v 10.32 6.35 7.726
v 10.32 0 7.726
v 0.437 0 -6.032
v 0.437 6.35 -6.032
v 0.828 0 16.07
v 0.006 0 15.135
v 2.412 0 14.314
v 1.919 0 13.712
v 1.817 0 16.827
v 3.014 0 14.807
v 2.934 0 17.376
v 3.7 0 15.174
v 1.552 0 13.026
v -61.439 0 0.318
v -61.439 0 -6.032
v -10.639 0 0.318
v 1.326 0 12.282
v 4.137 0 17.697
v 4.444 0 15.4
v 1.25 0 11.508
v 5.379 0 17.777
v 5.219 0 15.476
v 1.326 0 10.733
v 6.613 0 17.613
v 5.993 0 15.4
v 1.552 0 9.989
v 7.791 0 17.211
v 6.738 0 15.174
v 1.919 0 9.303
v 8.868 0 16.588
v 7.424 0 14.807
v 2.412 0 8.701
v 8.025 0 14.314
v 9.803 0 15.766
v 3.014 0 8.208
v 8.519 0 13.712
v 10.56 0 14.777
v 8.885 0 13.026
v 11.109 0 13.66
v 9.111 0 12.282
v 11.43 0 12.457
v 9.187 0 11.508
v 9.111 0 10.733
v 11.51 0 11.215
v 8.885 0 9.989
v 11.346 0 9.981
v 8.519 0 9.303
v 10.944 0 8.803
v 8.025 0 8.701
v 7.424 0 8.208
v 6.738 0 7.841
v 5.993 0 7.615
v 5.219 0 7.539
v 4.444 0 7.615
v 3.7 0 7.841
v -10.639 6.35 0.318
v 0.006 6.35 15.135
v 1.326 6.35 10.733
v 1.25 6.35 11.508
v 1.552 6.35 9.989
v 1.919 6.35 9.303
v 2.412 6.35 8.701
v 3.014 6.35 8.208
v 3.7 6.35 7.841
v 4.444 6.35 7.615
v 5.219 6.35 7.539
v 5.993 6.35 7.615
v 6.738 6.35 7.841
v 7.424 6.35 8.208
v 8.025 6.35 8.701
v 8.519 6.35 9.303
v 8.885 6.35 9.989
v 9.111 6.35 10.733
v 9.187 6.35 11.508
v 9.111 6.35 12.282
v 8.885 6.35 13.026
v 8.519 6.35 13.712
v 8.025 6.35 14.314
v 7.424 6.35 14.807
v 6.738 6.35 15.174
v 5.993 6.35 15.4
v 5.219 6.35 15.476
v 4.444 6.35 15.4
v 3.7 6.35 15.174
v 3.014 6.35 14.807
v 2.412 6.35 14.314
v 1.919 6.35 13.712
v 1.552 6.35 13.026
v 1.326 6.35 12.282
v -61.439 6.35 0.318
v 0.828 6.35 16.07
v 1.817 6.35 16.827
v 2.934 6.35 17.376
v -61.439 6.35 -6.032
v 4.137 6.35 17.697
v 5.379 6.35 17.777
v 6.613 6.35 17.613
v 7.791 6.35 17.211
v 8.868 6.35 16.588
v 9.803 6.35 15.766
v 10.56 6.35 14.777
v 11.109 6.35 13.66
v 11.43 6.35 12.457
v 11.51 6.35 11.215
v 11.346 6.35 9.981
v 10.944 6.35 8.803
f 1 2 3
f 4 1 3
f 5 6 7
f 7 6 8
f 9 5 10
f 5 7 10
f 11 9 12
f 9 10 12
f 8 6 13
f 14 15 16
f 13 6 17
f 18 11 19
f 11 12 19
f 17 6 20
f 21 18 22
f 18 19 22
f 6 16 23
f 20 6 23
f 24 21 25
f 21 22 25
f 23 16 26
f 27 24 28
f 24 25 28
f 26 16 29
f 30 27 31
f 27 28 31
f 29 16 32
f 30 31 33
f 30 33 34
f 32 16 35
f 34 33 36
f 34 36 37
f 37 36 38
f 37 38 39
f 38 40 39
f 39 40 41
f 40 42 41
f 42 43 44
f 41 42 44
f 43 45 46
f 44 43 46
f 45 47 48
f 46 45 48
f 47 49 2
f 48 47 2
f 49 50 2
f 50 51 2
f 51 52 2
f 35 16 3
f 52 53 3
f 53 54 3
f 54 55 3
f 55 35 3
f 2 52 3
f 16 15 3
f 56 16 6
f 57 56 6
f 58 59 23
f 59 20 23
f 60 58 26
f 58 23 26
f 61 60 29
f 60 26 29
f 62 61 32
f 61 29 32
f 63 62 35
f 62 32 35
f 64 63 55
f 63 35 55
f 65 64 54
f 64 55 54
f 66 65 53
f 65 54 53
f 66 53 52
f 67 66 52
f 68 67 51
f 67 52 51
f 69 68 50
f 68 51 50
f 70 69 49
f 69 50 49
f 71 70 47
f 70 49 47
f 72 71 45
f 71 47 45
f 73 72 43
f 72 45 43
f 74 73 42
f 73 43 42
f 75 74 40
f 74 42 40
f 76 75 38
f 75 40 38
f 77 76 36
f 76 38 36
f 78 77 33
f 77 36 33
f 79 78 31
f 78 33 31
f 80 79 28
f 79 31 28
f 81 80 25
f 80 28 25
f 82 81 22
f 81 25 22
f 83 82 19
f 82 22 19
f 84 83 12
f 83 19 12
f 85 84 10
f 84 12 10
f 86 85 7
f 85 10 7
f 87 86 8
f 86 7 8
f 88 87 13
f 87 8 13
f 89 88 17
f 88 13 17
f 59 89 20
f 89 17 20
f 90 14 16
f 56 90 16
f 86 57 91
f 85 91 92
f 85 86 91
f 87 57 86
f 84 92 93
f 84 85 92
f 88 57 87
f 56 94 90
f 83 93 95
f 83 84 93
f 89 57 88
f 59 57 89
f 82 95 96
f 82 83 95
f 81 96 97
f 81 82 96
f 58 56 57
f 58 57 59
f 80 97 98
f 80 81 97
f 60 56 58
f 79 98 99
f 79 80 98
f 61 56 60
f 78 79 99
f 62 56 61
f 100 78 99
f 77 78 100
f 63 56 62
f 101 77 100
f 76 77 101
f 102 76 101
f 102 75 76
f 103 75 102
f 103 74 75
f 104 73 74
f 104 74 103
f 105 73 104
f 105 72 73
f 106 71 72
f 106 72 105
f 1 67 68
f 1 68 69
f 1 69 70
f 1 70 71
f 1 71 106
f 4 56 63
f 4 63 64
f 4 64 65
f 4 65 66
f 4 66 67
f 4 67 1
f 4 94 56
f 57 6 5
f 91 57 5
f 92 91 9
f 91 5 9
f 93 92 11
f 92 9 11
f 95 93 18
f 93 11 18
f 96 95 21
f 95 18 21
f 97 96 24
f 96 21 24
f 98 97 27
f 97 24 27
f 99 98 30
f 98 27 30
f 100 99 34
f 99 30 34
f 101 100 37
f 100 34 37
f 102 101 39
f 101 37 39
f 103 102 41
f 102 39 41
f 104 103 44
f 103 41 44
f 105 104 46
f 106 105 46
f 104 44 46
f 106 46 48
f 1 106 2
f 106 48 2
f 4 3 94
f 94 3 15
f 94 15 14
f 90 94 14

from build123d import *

# Parameters (mm, degrees)
BOSS_EXTRUDE1_DEPTH         = 6.35
F_3_8_16_TAPPED_HOLE1_D     = 7.9375
F_3_8_16_TAPPED_HOLE1_DEPTH = 6.35
F_3_8_16_TAPPED_HOLE1_TIP   = 2.384665582


with BuildPart() as part:
    # Sketch2 → Boss-Extrude1 (new body)
    with BuildSketch(Plane(origin=(0, 0, 0), x_dir=(1, 0, 0), z_dir=(0, 1, 0))):
        with BuildLine():
            Line((-10.638933845, -0.317978242), (0.0062465, -15.135448057))
            ThreePointArc((0.0062465, -15.135448057), (8.868318086, -16.587580012), (10.320450041, -7.725508427))
            Line((10.320450041, -7.725508427), (0.436752504, 6.032021758))
            Line((0.436752504, 6.032021758), (-10.638933845, 6.032021758))
            Line((-10.638933845, 6.032021758), (-61.438933845, 6.032021758))
            Line((-61.438933845, 6.032021758), (-61.438933845, -0.317978242))
            Line((-61.438933845, -0.317978242), (-10.638933845, -0.317978242))
        make_face()
    extrude(amount=BOSS_EXTRUDE1_DEPTH)

    # 3/8-16 Tapped Hole1
    with Locations(Plane(origin=(0, 6.35, 0), x_dir=(1, 0, 0), z_dir=(0, 1, 0))):
        with Locations((5.218739795, -11.507580012)):
            Hole(F_3_8_16_TAPPED_HOLE1_D / 2, depth=F_3_8_16_TAPPED_HOLE1_DEPTH)
            with Locations((0, 0, -(F_3_8_16_TAPPED_HOLE1_DEPTH + F_3_8_16_TAPPED_HOLE1_TIP / 2))):  # 118° drill point
                Cone(0, F_3_8_16_TAPPED_HOLE1_D / 2, F_3_8_16_TAPPED_HOLE1_TIP, mode=Mode.SUBTRACT)


solid = part.part
